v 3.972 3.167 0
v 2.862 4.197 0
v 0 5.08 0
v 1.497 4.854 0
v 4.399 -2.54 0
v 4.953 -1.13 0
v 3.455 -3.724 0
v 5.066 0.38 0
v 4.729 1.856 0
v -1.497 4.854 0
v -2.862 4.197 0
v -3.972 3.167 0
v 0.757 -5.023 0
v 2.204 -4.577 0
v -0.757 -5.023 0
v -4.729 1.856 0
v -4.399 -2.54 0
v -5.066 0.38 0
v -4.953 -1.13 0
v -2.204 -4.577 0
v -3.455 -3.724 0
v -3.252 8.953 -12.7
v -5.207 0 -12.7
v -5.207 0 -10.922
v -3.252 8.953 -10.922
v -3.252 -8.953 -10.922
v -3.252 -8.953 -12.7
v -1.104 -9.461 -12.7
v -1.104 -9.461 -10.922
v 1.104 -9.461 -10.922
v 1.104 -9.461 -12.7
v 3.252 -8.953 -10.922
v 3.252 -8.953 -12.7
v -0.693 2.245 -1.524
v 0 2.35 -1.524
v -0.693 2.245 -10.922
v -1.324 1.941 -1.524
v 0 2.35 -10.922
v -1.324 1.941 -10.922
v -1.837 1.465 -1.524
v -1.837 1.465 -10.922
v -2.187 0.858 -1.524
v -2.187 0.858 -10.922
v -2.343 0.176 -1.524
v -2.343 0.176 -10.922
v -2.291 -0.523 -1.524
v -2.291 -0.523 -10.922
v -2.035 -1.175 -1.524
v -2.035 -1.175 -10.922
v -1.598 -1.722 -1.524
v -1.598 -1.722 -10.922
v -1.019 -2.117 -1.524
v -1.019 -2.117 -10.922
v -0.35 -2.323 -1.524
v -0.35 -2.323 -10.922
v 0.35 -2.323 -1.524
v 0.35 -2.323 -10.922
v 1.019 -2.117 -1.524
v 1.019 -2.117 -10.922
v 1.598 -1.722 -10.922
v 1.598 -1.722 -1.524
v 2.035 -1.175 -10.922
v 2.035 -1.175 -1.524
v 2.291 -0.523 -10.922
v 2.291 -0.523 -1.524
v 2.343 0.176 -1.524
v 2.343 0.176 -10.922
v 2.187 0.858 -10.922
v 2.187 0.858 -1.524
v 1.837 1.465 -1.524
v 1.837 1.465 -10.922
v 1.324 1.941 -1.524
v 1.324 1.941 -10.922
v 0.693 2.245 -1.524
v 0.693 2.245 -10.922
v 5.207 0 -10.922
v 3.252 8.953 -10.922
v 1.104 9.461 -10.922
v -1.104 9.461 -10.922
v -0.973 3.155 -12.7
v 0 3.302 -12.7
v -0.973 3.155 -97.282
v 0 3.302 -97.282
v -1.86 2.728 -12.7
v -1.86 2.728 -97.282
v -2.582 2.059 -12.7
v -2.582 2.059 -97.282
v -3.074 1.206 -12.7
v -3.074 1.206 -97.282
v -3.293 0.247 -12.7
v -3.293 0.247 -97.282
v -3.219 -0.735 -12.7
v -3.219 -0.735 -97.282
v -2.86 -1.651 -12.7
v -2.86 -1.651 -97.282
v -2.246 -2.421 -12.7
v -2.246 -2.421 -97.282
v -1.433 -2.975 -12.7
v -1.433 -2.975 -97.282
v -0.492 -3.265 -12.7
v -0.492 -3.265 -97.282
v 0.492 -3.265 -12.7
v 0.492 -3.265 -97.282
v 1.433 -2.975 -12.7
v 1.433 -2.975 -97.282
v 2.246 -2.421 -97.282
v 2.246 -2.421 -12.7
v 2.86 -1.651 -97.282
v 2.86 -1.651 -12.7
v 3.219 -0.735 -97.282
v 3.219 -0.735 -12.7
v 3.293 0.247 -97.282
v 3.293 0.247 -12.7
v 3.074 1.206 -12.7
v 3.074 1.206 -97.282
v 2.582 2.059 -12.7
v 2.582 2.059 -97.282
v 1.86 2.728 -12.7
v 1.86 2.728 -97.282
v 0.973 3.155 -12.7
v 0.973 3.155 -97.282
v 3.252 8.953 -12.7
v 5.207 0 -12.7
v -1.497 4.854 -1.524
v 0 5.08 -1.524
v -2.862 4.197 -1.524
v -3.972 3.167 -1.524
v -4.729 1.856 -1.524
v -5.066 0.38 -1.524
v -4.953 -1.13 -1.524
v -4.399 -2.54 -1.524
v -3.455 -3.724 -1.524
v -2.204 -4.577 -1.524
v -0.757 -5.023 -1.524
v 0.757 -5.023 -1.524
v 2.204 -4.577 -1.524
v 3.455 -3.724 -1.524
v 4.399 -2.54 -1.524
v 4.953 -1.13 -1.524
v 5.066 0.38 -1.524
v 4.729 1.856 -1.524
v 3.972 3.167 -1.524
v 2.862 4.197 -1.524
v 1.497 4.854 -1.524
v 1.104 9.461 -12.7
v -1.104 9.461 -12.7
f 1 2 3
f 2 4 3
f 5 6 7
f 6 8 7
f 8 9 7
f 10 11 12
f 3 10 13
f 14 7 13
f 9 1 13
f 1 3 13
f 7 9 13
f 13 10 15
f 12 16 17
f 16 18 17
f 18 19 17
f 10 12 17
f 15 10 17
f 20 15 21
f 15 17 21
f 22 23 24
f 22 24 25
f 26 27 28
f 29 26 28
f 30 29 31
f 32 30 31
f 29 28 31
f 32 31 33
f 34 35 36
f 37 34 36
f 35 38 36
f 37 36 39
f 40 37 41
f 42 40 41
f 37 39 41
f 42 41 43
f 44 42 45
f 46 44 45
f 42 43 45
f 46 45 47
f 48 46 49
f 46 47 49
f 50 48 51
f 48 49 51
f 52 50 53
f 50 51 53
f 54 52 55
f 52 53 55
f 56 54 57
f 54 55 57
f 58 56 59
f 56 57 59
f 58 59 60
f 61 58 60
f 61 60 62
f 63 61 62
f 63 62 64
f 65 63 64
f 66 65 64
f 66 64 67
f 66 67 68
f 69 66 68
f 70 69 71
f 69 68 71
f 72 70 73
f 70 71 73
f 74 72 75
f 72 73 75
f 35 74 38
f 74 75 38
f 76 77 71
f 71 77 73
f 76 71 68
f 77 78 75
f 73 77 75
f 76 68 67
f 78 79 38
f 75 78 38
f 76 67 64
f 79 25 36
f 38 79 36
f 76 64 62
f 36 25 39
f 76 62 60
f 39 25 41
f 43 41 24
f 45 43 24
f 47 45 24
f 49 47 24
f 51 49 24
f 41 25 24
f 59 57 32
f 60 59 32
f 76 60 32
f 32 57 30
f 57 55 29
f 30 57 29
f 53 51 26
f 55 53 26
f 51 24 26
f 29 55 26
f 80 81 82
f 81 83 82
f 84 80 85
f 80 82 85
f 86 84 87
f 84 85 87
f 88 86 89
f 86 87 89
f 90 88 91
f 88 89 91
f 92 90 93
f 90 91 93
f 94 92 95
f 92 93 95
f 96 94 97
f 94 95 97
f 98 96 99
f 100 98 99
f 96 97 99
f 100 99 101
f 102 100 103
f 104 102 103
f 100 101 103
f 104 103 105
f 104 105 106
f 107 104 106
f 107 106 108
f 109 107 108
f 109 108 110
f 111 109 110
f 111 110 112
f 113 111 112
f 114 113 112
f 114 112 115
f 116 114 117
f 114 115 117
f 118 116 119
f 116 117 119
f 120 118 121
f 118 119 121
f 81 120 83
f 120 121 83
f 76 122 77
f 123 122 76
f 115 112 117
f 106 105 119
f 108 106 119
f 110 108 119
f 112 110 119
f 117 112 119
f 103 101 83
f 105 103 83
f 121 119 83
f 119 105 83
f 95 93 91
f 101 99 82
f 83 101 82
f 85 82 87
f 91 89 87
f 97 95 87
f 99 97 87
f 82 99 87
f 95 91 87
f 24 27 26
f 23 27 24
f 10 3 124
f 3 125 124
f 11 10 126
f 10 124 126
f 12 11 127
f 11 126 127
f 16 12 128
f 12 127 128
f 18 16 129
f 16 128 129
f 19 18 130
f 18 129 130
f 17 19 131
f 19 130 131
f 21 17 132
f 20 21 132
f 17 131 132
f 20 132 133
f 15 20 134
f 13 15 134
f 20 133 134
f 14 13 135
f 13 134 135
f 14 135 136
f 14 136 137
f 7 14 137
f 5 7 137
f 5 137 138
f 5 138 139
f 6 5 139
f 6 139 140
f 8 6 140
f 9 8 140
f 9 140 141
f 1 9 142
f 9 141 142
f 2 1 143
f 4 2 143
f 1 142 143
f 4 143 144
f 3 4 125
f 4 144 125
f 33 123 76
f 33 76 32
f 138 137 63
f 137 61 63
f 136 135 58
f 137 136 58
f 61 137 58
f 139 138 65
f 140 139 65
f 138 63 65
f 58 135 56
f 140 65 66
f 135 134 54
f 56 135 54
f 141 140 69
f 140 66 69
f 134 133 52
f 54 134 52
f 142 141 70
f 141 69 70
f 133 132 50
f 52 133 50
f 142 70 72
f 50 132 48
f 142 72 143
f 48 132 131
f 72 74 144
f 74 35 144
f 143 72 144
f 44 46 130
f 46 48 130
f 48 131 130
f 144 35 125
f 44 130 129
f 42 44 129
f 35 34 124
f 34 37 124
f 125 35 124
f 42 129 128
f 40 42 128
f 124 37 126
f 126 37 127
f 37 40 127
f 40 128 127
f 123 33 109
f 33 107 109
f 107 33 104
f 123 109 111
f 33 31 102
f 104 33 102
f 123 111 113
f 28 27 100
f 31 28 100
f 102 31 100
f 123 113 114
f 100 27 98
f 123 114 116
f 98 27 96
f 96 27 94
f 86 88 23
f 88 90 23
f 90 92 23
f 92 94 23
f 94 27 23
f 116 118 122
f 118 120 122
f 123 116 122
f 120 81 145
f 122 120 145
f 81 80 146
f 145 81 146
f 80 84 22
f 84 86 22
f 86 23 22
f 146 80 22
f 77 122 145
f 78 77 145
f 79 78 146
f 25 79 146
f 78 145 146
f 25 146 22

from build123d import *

# Parameters (mm, degrees)
CORTAR_EXTRUIR1_START = -1.778
CORTAR_EXTRUIR1_DEPTH = 1.778


# Read off the part's stored shape, not the designer's step: Cortar-Extruir1
with BuildPart() as part:
    # Croquis1 → Revolución1 (revolve)
    with BuildSketch(Plane(origin=(0, 0, 0), x_dir=(0, 0, -1), z_dir=(1, 0, 0))):
        Polygon((0, 0), (0, 5.08), (1.524, 5.08), (1.524, 2.3495), (10.922, 2.3495), (10.922, 9.525), (12.7, 9.525), (12.7, 3.302), (97.282, 3.302), (97.282, 0), align=None)
    revolve(axis=Axis((0, 0, -97.282), (0, 0, 1)))

    # Cortar-Extruir1 outline → Cortar-Extruir1 (cut)
    with BuildSketch(Plane.XY.offset(-10.922).offset(CORTAR_EXTRUIR1_START)):
        with BuildLine():
            Line((-3.25214663, -8.952606732), (-5.207, 0))
            Line((-5.207, 0), (-3.25214663, 8.952606732))
            ThreePointArc((-3.25214663, 8.952606732), (-9.525, 0), (-3.25214663, -8.952606732))
        make_face()
        with BuildLine():
            Line((5.207, 0), (3.25214663, -8.952606732))
            ThreePointArc((3.25214663, -8.952606732), (9.525, 0), (3.25214663, 8.952606732))
            Line((3.25214663, 8.952606732), (5.207, 0))
        make_face()
    extrude(amount=CORTAR_EXTRUIR1_DEPTH, mode=Mode.SUBTRACT)


solid = part.part
